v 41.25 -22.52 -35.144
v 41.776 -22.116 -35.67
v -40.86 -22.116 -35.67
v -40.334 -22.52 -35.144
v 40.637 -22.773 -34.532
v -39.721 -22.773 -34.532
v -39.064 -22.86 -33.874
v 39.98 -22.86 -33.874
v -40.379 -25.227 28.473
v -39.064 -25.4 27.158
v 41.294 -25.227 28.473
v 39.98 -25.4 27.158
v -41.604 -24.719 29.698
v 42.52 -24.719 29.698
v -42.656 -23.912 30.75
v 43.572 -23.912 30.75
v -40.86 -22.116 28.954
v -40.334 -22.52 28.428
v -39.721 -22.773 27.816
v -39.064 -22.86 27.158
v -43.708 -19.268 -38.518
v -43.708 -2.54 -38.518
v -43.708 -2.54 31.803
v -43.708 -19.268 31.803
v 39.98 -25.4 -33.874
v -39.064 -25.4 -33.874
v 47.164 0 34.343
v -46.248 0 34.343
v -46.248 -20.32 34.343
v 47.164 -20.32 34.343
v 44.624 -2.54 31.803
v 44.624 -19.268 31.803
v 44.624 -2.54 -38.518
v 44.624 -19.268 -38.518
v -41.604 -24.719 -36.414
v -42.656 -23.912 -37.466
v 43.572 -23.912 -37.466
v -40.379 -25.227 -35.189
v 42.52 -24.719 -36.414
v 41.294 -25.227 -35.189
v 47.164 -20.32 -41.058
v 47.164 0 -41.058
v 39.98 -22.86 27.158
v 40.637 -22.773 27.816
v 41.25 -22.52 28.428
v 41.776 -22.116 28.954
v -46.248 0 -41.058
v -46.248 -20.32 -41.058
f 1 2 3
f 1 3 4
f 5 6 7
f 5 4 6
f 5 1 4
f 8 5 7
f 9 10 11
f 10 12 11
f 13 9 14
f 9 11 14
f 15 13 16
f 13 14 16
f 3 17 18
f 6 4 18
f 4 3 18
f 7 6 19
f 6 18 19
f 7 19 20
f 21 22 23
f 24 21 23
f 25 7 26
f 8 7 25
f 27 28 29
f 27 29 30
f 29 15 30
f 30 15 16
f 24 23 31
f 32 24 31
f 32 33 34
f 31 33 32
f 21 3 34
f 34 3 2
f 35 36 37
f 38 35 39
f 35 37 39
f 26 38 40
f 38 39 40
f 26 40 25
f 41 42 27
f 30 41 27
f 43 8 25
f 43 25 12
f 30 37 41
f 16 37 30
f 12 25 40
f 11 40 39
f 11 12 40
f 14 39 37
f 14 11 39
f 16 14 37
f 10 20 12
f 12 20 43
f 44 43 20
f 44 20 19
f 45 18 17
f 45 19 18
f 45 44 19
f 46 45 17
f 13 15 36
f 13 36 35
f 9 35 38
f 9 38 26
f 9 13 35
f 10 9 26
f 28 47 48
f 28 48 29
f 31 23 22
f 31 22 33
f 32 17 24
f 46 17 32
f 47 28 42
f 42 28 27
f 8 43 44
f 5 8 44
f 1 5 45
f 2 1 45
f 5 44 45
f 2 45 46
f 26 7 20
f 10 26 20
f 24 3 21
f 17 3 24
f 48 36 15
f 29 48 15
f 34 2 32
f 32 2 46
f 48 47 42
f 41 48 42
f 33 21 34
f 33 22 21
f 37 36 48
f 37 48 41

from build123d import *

# Parameters (mm, degrees)
F0_W     = 93.4118106961
F0_H     = 75.4010342062
F1_DEPTH = 25.4
F2_SIZE  = 5.08
F3_R     = 5.08
F4_T     = -2.54


# Not quite as in the source:
# - a shell that OpenCascade refuses in one call is made with other operations: the cavity is built on its own and cut out


with BuildPart() as f1:
    # F0 (on Front) → F1 (new body)
    with BuildSketch(Plane.XZ):
        with Locations((0.4579015076, -3.3579412848)):
            Rectangle(F0_W, F0_H)
    extrude(amount=F1_DEPTH)

    # F2
    f2_edges = [f1.edges().sort_by_distance(p)[0] for p in [
        (0.457902, -25.4, 34.342576),
        (-46.248004, -25.4, -3.357941),
        (0.457902, -25.4, -41.058458),
        (47.163807, -25.4, -3.357941),
    ]]
    chamfer(f2_edges, length=F2_SIZE)

    # F3
    f3_edges = [f1.edges().sort_by_distance(p)[0] for p in [
        (0.457902, -25.4, 29.262576),
        (42.083807, -25.4, -3.357941),
        (-41.168004, -25.4, -3.357941),
        (0.457902, -25.4, -35.978458),
    ]]
    fillet(f3_edges, radius=F3_R)

    # F4: a shell. OpenCascade refuses it in one call, so the cavity is built on its own and cut out:
    # the body offset inwards by the wall thickness, plus a prism from it out through each open face.
    f4_core = offset(f1.part, amount=F4_T, mode=Mode.PRIVATE)
    f4_exits = [f4_core.faces().sort_by_distance(p)[0] for p in [
        (0.457902, -22.86, -3.357941),
    ]]
    add(f4_core, mode=Mode.SUBTRACT)
    extrude(f4_exits, amount=-F4_T, mode=Mode.SUBTRACT)


solid = f1.part
